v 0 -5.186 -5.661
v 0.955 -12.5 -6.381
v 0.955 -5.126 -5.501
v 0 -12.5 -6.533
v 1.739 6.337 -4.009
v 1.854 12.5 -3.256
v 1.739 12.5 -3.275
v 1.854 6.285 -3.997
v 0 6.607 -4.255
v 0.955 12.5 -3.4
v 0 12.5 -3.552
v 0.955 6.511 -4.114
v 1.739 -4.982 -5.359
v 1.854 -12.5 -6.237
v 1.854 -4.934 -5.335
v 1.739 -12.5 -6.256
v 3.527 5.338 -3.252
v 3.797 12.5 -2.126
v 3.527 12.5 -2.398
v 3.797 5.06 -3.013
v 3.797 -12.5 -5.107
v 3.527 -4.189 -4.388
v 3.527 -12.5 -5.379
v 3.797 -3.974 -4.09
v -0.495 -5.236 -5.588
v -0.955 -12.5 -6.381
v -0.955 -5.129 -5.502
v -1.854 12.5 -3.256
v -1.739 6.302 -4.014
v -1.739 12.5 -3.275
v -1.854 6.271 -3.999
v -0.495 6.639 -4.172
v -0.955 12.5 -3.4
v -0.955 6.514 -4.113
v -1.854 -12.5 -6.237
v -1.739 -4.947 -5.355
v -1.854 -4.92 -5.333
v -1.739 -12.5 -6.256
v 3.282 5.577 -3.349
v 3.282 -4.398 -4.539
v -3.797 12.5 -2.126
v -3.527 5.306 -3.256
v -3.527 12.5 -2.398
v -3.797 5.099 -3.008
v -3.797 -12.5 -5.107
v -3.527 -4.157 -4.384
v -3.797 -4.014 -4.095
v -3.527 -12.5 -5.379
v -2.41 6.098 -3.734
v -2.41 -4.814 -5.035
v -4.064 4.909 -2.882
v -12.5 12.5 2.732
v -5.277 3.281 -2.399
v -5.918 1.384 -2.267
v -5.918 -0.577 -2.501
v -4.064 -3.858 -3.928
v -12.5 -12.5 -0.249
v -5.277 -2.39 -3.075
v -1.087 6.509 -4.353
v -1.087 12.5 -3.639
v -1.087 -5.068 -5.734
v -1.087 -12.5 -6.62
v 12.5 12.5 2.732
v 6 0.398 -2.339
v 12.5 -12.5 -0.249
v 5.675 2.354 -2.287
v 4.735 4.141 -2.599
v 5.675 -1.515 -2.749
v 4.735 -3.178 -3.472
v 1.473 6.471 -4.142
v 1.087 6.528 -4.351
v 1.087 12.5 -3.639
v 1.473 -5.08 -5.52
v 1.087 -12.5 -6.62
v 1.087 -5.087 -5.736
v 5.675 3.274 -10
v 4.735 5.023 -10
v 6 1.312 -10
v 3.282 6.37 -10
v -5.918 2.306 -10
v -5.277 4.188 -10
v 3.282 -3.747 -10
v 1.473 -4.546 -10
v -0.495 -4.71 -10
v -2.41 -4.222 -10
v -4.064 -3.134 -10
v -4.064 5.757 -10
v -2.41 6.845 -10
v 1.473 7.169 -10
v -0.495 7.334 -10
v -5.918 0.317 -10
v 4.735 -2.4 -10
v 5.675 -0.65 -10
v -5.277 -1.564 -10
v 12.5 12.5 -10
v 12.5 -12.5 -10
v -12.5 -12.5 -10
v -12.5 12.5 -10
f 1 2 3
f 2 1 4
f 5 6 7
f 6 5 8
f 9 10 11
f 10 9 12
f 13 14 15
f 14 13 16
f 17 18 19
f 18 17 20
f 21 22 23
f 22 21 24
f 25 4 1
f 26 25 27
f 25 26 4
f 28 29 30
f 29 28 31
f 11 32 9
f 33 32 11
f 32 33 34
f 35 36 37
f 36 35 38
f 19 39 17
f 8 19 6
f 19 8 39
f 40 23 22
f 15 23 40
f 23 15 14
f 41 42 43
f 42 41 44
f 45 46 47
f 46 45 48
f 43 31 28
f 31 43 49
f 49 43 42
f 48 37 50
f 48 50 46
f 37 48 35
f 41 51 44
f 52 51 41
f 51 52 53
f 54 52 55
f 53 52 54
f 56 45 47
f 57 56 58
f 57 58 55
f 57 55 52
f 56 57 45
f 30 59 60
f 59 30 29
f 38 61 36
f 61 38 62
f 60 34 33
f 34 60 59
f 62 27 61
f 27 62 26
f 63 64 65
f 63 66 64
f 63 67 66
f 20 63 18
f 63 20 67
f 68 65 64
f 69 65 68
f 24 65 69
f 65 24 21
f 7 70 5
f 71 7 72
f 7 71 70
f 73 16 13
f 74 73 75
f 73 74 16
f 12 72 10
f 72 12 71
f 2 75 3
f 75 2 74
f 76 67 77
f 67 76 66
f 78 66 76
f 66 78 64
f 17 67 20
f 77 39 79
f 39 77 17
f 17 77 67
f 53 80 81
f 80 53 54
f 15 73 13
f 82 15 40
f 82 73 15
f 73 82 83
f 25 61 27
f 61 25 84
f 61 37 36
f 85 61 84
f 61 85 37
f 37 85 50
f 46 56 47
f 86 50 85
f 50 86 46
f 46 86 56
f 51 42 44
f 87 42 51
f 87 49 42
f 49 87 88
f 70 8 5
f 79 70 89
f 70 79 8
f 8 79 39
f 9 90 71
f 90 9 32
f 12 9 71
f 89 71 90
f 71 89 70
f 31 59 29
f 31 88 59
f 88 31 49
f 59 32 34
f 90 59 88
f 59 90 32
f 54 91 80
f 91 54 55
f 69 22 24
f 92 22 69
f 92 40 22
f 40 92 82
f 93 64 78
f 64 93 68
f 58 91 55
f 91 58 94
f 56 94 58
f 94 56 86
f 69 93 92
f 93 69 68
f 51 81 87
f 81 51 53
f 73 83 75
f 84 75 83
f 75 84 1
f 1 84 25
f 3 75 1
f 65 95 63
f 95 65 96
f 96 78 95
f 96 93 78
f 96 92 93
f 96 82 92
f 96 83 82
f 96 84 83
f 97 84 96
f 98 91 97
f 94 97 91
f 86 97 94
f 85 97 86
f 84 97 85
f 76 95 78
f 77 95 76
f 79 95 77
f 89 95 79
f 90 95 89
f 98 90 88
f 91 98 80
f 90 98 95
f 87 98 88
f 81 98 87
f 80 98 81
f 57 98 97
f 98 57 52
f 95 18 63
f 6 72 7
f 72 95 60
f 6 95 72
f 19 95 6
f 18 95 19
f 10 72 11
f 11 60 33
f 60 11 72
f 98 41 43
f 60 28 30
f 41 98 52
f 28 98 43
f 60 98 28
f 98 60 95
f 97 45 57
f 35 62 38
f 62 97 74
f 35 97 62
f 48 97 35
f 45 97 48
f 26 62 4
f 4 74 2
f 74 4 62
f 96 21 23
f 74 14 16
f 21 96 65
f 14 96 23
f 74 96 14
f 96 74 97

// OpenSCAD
module hull()
{
	union() {
		rotate([90, 0, 0]) cylinder(r = 6, h = 30, center = true, $fn = 20);
		rotate([0, -61, 0]) translate([1.65, 0, 23]) cube([15, 30, 50], center = true);
		rotate([0, 61, 0]) translate([-1.65, 0, 23]) cube([15, 30, 50], center = true);
		translate([0, 0, 35]) cube([30, 30, 50], center = true);
		cylinder(r = 6, h = 50, center = true);
	}
}

module rudder_housing() {
	union() {
		difference() {
			cube([25, 25, 20], center = true);
			translate([0, 0, 1]) rotate([6.8, 0, 0]) hull();
		}
	}
}

rudder_housing();
